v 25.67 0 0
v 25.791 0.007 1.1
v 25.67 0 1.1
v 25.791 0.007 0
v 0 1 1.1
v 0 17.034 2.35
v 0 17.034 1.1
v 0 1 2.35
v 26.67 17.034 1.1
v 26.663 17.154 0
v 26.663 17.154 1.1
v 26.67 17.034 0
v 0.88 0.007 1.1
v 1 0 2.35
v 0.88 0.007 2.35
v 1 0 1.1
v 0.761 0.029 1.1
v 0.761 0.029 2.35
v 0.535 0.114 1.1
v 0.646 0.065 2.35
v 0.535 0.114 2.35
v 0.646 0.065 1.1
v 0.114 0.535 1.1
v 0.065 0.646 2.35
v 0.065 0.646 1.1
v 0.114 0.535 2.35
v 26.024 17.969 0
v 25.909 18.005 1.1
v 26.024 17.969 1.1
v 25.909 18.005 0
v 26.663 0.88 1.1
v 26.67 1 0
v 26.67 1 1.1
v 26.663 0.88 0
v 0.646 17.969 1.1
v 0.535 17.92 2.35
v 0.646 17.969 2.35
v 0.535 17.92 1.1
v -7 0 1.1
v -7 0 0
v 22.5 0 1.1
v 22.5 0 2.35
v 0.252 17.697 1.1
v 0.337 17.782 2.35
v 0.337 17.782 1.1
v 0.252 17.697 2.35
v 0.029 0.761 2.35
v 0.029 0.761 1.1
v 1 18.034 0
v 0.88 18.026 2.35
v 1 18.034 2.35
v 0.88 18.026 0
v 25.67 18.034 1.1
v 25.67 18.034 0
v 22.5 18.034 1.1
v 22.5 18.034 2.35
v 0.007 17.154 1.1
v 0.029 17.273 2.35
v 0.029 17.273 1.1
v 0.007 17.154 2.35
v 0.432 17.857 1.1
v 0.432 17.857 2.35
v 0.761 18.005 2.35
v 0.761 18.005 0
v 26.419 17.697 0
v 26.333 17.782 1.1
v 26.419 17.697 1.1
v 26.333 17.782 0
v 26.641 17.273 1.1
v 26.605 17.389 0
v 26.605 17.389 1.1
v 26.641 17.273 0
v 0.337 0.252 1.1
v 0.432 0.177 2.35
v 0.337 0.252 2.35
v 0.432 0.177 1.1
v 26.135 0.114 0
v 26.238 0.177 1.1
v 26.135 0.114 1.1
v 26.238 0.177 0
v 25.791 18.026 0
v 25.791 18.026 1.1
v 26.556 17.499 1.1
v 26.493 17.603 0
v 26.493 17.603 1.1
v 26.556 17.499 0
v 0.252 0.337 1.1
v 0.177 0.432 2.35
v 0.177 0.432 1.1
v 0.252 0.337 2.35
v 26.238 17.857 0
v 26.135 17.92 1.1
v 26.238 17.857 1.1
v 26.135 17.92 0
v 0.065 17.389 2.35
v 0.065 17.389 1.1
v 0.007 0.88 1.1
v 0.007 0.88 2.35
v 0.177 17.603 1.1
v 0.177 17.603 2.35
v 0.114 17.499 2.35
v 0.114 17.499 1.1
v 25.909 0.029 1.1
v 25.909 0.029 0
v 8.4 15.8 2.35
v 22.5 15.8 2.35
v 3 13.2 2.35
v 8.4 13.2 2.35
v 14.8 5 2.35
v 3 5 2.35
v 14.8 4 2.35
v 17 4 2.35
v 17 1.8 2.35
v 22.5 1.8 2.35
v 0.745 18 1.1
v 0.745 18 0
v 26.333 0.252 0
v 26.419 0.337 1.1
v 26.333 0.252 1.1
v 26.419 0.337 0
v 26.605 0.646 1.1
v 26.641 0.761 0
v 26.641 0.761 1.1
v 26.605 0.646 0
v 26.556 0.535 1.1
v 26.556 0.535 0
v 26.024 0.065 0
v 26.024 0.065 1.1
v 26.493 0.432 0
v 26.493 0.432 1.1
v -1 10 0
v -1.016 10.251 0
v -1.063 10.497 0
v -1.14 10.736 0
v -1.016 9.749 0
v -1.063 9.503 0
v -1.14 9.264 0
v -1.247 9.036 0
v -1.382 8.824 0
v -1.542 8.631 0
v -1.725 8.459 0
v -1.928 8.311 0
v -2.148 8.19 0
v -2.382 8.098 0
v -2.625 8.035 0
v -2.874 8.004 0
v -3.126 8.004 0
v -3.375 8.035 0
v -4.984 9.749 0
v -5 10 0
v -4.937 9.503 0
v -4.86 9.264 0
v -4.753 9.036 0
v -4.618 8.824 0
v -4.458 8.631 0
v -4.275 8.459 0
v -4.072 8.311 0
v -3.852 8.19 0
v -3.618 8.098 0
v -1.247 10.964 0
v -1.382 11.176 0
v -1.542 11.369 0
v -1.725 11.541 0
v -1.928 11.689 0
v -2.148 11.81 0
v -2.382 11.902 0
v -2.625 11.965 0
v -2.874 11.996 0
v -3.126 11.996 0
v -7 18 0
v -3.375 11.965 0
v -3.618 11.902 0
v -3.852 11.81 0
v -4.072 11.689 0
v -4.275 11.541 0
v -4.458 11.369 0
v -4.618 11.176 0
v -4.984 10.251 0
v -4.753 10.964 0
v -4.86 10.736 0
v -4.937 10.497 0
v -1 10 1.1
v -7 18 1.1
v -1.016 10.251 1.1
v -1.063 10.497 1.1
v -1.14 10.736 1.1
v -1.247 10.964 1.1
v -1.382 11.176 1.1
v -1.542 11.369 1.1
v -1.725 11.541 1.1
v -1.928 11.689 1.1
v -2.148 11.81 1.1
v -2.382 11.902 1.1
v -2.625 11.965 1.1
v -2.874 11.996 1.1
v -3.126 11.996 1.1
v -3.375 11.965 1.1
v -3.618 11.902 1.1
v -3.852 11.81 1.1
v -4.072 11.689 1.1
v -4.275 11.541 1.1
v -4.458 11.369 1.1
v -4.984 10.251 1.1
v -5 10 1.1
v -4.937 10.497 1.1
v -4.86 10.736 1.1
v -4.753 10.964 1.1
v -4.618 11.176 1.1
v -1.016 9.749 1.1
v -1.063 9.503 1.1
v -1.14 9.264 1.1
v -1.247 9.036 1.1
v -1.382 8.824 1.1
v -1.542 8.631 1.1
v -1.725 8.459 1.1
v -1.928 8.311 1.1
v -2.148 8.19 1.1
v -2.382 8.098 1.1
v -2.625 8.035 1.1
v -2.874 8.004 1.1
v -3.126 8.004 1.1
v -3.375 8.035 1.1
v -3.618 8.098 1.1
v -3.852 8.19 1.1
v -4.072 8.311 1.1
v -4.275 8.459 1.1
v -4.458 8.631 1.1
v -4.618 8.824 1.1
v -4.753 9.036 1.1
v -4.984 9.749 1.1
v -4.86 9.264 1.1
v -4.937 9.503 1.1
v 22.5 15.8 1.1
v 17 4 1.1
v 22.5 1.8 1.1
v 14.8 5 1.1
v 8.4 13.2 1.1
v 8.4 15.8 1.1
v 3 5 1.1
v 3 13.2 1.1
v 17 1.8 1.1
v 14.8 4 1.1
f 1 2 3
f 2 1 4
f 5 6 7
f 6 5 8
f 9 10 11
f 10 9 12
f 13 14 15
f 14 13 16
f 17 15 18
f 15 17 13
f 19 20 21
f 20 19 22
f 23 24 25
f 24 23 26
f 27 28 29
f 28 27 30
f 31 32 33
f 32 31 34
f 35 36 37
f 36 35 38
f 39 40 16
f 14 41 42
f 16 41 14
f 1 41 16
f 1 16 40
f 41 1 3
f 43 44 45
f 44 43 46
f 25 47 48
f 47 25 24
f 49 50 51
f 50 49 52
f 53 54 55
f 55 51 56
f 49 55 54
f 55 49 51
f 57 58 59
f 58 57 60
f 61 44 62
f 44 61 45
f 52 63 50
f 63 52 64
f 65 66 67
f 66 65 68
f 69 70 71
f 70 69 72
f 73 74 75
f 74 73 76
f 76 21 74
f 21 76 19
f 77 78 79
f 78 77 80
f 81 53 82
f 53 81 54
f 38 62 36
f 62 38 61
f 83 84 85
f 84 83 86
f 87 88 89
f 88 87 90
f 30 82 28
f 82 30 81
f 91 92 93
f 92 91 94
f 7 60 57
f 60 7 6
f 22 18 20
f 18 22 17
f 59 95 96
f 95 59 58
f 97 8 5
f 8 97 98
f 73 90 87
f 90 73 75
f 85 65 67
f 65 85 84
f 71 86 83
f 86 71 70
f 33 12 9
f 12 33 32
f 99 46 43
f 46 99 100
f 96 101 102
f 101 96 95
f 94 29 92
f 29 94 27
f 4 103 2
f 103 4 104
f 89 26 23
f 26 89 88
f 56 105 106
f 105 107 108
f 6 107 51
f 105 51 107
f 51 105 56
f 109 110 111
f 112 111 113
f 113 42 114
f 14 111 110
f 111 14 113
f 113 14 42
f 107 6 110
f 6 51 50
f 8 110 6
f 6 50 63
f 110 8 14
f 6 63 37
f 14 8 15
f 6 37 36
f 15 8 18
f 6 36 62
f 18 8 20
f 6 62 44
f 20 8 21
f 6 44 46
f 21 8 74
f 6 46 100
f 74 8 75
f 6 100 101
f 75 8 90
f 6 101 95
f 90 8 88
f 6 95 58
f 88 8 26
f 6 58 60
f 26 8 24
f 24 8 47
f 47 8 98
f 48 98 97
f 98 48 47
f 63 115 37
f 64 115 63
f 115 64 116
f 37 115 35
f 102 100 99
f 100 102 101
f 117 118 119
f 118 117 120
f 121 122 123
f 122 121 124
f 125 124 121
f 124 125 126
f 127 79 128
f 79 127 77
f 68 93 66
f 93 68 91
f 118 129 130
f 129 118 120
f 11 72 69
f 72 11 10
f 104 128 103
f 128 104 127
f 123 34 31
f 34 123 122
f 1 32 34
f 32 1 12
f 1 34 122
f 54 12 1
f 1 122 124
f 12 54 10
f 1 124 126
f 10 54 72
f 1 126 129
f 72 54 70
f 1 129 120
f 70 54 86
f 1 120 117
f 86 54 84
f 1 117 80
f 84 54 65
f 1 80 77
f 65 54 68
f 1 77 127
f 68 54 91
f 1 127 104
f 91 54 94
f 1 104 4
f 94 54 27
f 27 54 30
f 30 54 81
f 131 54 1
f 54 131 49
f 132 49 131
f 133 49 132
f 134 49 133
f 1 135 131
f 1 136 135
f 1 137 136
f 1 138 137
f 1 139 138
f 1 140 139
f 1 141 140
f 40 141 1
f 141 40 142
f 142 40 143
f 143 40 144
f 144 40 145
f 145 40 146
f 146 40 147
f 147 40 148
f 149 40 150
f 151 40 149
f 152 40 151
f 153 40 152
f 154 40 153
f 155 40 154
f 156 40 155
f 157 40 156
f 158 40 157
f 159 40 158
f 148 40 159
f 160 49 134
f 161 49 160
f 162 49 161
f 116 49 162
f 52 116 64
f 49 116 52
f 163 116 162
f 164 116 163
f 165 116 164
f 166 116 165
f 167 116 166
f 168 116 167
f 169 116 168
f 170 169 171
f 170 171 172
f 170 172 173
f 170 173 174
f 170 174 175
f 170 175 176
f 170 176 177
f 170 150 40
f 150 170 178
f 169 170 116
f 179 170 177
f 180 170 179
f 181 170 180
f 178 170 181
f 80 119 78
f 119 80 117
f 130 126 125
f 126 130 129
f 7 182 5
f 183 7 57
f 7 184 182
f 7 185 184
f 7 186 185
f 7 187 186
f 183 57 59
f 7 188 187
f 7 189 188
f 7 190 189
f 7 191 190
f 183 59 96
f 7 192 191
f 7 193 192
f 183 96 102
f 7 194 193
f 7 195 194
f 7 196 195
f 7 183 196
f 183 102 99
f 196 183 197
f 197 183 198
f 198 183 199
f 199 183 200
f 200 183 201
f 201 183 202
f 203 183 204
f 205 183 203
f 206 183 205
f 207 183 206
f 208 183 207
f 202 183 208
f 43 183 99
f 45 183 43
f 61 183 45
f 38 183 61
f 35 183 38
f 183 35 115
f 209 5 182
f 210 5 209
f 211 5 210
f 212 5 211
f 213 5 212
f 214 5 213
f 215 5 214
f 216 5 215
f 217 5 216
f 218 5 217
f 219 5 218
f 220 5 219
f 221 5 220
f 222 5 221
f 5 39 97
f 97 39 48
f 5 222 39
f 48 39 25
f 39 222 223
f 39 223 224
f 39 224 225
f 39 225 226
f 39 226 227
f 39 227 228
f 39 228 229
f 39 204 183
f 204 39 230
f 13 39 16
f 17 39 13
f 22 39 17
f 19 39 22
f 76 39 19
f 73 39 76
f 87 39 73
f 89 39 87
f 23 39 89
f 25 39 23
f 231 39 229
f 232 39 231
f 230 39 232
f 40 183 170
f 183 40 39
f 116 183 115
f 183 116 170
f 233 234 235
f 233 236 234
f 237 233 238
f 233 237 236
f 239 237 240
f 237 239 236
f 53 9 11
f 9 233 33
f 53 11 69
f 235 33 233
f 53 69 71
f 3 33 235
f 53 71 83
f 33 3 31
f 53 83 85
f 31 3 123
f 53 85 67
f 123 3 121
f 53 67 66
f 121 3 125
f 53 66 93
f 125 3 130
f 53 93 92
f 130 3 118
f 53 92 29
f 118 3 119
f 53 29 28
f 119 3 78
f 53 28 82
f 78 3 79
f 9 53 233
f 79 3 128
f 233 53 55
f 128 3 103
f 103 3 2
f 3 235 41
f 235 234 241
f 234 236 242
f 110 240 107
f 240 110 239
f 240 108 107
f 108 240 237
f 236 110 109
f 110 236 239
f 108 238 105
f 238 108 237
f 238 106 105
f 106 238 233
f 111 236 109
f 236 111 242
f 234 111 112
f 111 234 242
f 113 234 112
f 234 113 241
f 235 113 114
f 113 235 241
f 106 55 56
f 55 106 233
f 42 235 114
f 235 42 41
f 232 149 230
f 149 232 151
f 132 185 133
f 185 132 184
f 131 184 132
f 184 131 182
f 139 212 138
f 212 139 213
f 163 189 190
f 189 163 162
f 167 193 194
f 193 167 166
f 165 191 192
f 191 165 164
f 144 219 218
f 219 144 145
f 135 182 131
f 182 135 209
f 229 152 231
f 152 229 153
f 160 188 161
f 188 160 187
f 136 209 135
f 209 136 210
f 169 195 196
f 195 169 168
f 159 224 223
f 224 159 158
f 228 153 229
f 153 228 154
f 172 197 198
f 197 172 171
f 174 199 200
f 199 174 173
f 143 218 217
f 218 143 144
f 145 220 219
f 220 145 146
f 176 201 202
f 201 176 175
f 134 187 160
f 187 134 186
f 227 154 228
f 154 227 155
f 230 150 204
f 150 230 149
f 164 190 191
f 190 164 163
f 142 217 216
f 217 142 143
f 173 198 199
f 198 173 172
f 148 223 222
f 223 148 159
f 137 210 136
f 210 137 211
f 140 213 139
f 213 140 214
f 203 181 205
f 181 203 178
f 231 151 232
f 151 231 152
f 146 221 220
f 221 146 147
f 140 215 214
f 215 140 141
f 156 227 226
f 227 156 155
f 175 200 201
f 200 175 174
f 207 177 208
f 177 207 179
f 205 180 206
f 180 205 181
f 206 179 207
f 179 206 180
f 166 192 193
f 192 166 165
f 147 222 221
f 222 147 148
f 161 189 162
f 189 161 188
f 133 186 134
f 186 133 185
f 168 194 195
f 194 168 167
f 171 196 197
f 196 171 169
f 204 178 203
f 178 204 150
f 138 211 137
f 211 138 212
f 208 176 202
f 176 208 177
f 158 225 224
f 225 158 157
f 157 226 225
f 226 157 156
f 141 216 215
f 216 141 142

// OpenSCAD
// Case for the LANE Boys RC DIY light controller
// Fits into the Killerbody light control box
//
// Print with 0.2 mm layer height

$fn = 50;
eps = 0.05;

h_bottom = 0.6 + 0.5;
h_middle = 1.3;

h_total = h_bottom + h_middle;

h_cutout = h_middle + eps;

difference() {
    union() {
        translate([0, 0, 0]) linear_extrude(h_total-eps)
            import("bottom.dxf");
    
        // Extend to the left to brace inside the Killerbody case
        translate([-7, 0, 0]) cube([7+2, 18, h_bottom]);
    }
    
    // Hole for feeding the wires 
    translate([-3, 10, -eps]) cylinder(d=4, h=h_total+eps+eps);
    
    translate([0, 0, h_bottom]) {
        translate([3, 5, 0]) cube([16, 8.2, h_cutout]);
        translate([8.4, 5, 0]) cube([16, 10.8, h_cutout]);
        translate([14.8, 4, 0]) cube([5, 5, h_cutout]);
        translate([17, 1.8, 0]) cube([8, 5, h_cutout]);
        translate([22.5, -eps, 0]) cube([10, 18+eps+eps, h_cutout]);
    }
}
